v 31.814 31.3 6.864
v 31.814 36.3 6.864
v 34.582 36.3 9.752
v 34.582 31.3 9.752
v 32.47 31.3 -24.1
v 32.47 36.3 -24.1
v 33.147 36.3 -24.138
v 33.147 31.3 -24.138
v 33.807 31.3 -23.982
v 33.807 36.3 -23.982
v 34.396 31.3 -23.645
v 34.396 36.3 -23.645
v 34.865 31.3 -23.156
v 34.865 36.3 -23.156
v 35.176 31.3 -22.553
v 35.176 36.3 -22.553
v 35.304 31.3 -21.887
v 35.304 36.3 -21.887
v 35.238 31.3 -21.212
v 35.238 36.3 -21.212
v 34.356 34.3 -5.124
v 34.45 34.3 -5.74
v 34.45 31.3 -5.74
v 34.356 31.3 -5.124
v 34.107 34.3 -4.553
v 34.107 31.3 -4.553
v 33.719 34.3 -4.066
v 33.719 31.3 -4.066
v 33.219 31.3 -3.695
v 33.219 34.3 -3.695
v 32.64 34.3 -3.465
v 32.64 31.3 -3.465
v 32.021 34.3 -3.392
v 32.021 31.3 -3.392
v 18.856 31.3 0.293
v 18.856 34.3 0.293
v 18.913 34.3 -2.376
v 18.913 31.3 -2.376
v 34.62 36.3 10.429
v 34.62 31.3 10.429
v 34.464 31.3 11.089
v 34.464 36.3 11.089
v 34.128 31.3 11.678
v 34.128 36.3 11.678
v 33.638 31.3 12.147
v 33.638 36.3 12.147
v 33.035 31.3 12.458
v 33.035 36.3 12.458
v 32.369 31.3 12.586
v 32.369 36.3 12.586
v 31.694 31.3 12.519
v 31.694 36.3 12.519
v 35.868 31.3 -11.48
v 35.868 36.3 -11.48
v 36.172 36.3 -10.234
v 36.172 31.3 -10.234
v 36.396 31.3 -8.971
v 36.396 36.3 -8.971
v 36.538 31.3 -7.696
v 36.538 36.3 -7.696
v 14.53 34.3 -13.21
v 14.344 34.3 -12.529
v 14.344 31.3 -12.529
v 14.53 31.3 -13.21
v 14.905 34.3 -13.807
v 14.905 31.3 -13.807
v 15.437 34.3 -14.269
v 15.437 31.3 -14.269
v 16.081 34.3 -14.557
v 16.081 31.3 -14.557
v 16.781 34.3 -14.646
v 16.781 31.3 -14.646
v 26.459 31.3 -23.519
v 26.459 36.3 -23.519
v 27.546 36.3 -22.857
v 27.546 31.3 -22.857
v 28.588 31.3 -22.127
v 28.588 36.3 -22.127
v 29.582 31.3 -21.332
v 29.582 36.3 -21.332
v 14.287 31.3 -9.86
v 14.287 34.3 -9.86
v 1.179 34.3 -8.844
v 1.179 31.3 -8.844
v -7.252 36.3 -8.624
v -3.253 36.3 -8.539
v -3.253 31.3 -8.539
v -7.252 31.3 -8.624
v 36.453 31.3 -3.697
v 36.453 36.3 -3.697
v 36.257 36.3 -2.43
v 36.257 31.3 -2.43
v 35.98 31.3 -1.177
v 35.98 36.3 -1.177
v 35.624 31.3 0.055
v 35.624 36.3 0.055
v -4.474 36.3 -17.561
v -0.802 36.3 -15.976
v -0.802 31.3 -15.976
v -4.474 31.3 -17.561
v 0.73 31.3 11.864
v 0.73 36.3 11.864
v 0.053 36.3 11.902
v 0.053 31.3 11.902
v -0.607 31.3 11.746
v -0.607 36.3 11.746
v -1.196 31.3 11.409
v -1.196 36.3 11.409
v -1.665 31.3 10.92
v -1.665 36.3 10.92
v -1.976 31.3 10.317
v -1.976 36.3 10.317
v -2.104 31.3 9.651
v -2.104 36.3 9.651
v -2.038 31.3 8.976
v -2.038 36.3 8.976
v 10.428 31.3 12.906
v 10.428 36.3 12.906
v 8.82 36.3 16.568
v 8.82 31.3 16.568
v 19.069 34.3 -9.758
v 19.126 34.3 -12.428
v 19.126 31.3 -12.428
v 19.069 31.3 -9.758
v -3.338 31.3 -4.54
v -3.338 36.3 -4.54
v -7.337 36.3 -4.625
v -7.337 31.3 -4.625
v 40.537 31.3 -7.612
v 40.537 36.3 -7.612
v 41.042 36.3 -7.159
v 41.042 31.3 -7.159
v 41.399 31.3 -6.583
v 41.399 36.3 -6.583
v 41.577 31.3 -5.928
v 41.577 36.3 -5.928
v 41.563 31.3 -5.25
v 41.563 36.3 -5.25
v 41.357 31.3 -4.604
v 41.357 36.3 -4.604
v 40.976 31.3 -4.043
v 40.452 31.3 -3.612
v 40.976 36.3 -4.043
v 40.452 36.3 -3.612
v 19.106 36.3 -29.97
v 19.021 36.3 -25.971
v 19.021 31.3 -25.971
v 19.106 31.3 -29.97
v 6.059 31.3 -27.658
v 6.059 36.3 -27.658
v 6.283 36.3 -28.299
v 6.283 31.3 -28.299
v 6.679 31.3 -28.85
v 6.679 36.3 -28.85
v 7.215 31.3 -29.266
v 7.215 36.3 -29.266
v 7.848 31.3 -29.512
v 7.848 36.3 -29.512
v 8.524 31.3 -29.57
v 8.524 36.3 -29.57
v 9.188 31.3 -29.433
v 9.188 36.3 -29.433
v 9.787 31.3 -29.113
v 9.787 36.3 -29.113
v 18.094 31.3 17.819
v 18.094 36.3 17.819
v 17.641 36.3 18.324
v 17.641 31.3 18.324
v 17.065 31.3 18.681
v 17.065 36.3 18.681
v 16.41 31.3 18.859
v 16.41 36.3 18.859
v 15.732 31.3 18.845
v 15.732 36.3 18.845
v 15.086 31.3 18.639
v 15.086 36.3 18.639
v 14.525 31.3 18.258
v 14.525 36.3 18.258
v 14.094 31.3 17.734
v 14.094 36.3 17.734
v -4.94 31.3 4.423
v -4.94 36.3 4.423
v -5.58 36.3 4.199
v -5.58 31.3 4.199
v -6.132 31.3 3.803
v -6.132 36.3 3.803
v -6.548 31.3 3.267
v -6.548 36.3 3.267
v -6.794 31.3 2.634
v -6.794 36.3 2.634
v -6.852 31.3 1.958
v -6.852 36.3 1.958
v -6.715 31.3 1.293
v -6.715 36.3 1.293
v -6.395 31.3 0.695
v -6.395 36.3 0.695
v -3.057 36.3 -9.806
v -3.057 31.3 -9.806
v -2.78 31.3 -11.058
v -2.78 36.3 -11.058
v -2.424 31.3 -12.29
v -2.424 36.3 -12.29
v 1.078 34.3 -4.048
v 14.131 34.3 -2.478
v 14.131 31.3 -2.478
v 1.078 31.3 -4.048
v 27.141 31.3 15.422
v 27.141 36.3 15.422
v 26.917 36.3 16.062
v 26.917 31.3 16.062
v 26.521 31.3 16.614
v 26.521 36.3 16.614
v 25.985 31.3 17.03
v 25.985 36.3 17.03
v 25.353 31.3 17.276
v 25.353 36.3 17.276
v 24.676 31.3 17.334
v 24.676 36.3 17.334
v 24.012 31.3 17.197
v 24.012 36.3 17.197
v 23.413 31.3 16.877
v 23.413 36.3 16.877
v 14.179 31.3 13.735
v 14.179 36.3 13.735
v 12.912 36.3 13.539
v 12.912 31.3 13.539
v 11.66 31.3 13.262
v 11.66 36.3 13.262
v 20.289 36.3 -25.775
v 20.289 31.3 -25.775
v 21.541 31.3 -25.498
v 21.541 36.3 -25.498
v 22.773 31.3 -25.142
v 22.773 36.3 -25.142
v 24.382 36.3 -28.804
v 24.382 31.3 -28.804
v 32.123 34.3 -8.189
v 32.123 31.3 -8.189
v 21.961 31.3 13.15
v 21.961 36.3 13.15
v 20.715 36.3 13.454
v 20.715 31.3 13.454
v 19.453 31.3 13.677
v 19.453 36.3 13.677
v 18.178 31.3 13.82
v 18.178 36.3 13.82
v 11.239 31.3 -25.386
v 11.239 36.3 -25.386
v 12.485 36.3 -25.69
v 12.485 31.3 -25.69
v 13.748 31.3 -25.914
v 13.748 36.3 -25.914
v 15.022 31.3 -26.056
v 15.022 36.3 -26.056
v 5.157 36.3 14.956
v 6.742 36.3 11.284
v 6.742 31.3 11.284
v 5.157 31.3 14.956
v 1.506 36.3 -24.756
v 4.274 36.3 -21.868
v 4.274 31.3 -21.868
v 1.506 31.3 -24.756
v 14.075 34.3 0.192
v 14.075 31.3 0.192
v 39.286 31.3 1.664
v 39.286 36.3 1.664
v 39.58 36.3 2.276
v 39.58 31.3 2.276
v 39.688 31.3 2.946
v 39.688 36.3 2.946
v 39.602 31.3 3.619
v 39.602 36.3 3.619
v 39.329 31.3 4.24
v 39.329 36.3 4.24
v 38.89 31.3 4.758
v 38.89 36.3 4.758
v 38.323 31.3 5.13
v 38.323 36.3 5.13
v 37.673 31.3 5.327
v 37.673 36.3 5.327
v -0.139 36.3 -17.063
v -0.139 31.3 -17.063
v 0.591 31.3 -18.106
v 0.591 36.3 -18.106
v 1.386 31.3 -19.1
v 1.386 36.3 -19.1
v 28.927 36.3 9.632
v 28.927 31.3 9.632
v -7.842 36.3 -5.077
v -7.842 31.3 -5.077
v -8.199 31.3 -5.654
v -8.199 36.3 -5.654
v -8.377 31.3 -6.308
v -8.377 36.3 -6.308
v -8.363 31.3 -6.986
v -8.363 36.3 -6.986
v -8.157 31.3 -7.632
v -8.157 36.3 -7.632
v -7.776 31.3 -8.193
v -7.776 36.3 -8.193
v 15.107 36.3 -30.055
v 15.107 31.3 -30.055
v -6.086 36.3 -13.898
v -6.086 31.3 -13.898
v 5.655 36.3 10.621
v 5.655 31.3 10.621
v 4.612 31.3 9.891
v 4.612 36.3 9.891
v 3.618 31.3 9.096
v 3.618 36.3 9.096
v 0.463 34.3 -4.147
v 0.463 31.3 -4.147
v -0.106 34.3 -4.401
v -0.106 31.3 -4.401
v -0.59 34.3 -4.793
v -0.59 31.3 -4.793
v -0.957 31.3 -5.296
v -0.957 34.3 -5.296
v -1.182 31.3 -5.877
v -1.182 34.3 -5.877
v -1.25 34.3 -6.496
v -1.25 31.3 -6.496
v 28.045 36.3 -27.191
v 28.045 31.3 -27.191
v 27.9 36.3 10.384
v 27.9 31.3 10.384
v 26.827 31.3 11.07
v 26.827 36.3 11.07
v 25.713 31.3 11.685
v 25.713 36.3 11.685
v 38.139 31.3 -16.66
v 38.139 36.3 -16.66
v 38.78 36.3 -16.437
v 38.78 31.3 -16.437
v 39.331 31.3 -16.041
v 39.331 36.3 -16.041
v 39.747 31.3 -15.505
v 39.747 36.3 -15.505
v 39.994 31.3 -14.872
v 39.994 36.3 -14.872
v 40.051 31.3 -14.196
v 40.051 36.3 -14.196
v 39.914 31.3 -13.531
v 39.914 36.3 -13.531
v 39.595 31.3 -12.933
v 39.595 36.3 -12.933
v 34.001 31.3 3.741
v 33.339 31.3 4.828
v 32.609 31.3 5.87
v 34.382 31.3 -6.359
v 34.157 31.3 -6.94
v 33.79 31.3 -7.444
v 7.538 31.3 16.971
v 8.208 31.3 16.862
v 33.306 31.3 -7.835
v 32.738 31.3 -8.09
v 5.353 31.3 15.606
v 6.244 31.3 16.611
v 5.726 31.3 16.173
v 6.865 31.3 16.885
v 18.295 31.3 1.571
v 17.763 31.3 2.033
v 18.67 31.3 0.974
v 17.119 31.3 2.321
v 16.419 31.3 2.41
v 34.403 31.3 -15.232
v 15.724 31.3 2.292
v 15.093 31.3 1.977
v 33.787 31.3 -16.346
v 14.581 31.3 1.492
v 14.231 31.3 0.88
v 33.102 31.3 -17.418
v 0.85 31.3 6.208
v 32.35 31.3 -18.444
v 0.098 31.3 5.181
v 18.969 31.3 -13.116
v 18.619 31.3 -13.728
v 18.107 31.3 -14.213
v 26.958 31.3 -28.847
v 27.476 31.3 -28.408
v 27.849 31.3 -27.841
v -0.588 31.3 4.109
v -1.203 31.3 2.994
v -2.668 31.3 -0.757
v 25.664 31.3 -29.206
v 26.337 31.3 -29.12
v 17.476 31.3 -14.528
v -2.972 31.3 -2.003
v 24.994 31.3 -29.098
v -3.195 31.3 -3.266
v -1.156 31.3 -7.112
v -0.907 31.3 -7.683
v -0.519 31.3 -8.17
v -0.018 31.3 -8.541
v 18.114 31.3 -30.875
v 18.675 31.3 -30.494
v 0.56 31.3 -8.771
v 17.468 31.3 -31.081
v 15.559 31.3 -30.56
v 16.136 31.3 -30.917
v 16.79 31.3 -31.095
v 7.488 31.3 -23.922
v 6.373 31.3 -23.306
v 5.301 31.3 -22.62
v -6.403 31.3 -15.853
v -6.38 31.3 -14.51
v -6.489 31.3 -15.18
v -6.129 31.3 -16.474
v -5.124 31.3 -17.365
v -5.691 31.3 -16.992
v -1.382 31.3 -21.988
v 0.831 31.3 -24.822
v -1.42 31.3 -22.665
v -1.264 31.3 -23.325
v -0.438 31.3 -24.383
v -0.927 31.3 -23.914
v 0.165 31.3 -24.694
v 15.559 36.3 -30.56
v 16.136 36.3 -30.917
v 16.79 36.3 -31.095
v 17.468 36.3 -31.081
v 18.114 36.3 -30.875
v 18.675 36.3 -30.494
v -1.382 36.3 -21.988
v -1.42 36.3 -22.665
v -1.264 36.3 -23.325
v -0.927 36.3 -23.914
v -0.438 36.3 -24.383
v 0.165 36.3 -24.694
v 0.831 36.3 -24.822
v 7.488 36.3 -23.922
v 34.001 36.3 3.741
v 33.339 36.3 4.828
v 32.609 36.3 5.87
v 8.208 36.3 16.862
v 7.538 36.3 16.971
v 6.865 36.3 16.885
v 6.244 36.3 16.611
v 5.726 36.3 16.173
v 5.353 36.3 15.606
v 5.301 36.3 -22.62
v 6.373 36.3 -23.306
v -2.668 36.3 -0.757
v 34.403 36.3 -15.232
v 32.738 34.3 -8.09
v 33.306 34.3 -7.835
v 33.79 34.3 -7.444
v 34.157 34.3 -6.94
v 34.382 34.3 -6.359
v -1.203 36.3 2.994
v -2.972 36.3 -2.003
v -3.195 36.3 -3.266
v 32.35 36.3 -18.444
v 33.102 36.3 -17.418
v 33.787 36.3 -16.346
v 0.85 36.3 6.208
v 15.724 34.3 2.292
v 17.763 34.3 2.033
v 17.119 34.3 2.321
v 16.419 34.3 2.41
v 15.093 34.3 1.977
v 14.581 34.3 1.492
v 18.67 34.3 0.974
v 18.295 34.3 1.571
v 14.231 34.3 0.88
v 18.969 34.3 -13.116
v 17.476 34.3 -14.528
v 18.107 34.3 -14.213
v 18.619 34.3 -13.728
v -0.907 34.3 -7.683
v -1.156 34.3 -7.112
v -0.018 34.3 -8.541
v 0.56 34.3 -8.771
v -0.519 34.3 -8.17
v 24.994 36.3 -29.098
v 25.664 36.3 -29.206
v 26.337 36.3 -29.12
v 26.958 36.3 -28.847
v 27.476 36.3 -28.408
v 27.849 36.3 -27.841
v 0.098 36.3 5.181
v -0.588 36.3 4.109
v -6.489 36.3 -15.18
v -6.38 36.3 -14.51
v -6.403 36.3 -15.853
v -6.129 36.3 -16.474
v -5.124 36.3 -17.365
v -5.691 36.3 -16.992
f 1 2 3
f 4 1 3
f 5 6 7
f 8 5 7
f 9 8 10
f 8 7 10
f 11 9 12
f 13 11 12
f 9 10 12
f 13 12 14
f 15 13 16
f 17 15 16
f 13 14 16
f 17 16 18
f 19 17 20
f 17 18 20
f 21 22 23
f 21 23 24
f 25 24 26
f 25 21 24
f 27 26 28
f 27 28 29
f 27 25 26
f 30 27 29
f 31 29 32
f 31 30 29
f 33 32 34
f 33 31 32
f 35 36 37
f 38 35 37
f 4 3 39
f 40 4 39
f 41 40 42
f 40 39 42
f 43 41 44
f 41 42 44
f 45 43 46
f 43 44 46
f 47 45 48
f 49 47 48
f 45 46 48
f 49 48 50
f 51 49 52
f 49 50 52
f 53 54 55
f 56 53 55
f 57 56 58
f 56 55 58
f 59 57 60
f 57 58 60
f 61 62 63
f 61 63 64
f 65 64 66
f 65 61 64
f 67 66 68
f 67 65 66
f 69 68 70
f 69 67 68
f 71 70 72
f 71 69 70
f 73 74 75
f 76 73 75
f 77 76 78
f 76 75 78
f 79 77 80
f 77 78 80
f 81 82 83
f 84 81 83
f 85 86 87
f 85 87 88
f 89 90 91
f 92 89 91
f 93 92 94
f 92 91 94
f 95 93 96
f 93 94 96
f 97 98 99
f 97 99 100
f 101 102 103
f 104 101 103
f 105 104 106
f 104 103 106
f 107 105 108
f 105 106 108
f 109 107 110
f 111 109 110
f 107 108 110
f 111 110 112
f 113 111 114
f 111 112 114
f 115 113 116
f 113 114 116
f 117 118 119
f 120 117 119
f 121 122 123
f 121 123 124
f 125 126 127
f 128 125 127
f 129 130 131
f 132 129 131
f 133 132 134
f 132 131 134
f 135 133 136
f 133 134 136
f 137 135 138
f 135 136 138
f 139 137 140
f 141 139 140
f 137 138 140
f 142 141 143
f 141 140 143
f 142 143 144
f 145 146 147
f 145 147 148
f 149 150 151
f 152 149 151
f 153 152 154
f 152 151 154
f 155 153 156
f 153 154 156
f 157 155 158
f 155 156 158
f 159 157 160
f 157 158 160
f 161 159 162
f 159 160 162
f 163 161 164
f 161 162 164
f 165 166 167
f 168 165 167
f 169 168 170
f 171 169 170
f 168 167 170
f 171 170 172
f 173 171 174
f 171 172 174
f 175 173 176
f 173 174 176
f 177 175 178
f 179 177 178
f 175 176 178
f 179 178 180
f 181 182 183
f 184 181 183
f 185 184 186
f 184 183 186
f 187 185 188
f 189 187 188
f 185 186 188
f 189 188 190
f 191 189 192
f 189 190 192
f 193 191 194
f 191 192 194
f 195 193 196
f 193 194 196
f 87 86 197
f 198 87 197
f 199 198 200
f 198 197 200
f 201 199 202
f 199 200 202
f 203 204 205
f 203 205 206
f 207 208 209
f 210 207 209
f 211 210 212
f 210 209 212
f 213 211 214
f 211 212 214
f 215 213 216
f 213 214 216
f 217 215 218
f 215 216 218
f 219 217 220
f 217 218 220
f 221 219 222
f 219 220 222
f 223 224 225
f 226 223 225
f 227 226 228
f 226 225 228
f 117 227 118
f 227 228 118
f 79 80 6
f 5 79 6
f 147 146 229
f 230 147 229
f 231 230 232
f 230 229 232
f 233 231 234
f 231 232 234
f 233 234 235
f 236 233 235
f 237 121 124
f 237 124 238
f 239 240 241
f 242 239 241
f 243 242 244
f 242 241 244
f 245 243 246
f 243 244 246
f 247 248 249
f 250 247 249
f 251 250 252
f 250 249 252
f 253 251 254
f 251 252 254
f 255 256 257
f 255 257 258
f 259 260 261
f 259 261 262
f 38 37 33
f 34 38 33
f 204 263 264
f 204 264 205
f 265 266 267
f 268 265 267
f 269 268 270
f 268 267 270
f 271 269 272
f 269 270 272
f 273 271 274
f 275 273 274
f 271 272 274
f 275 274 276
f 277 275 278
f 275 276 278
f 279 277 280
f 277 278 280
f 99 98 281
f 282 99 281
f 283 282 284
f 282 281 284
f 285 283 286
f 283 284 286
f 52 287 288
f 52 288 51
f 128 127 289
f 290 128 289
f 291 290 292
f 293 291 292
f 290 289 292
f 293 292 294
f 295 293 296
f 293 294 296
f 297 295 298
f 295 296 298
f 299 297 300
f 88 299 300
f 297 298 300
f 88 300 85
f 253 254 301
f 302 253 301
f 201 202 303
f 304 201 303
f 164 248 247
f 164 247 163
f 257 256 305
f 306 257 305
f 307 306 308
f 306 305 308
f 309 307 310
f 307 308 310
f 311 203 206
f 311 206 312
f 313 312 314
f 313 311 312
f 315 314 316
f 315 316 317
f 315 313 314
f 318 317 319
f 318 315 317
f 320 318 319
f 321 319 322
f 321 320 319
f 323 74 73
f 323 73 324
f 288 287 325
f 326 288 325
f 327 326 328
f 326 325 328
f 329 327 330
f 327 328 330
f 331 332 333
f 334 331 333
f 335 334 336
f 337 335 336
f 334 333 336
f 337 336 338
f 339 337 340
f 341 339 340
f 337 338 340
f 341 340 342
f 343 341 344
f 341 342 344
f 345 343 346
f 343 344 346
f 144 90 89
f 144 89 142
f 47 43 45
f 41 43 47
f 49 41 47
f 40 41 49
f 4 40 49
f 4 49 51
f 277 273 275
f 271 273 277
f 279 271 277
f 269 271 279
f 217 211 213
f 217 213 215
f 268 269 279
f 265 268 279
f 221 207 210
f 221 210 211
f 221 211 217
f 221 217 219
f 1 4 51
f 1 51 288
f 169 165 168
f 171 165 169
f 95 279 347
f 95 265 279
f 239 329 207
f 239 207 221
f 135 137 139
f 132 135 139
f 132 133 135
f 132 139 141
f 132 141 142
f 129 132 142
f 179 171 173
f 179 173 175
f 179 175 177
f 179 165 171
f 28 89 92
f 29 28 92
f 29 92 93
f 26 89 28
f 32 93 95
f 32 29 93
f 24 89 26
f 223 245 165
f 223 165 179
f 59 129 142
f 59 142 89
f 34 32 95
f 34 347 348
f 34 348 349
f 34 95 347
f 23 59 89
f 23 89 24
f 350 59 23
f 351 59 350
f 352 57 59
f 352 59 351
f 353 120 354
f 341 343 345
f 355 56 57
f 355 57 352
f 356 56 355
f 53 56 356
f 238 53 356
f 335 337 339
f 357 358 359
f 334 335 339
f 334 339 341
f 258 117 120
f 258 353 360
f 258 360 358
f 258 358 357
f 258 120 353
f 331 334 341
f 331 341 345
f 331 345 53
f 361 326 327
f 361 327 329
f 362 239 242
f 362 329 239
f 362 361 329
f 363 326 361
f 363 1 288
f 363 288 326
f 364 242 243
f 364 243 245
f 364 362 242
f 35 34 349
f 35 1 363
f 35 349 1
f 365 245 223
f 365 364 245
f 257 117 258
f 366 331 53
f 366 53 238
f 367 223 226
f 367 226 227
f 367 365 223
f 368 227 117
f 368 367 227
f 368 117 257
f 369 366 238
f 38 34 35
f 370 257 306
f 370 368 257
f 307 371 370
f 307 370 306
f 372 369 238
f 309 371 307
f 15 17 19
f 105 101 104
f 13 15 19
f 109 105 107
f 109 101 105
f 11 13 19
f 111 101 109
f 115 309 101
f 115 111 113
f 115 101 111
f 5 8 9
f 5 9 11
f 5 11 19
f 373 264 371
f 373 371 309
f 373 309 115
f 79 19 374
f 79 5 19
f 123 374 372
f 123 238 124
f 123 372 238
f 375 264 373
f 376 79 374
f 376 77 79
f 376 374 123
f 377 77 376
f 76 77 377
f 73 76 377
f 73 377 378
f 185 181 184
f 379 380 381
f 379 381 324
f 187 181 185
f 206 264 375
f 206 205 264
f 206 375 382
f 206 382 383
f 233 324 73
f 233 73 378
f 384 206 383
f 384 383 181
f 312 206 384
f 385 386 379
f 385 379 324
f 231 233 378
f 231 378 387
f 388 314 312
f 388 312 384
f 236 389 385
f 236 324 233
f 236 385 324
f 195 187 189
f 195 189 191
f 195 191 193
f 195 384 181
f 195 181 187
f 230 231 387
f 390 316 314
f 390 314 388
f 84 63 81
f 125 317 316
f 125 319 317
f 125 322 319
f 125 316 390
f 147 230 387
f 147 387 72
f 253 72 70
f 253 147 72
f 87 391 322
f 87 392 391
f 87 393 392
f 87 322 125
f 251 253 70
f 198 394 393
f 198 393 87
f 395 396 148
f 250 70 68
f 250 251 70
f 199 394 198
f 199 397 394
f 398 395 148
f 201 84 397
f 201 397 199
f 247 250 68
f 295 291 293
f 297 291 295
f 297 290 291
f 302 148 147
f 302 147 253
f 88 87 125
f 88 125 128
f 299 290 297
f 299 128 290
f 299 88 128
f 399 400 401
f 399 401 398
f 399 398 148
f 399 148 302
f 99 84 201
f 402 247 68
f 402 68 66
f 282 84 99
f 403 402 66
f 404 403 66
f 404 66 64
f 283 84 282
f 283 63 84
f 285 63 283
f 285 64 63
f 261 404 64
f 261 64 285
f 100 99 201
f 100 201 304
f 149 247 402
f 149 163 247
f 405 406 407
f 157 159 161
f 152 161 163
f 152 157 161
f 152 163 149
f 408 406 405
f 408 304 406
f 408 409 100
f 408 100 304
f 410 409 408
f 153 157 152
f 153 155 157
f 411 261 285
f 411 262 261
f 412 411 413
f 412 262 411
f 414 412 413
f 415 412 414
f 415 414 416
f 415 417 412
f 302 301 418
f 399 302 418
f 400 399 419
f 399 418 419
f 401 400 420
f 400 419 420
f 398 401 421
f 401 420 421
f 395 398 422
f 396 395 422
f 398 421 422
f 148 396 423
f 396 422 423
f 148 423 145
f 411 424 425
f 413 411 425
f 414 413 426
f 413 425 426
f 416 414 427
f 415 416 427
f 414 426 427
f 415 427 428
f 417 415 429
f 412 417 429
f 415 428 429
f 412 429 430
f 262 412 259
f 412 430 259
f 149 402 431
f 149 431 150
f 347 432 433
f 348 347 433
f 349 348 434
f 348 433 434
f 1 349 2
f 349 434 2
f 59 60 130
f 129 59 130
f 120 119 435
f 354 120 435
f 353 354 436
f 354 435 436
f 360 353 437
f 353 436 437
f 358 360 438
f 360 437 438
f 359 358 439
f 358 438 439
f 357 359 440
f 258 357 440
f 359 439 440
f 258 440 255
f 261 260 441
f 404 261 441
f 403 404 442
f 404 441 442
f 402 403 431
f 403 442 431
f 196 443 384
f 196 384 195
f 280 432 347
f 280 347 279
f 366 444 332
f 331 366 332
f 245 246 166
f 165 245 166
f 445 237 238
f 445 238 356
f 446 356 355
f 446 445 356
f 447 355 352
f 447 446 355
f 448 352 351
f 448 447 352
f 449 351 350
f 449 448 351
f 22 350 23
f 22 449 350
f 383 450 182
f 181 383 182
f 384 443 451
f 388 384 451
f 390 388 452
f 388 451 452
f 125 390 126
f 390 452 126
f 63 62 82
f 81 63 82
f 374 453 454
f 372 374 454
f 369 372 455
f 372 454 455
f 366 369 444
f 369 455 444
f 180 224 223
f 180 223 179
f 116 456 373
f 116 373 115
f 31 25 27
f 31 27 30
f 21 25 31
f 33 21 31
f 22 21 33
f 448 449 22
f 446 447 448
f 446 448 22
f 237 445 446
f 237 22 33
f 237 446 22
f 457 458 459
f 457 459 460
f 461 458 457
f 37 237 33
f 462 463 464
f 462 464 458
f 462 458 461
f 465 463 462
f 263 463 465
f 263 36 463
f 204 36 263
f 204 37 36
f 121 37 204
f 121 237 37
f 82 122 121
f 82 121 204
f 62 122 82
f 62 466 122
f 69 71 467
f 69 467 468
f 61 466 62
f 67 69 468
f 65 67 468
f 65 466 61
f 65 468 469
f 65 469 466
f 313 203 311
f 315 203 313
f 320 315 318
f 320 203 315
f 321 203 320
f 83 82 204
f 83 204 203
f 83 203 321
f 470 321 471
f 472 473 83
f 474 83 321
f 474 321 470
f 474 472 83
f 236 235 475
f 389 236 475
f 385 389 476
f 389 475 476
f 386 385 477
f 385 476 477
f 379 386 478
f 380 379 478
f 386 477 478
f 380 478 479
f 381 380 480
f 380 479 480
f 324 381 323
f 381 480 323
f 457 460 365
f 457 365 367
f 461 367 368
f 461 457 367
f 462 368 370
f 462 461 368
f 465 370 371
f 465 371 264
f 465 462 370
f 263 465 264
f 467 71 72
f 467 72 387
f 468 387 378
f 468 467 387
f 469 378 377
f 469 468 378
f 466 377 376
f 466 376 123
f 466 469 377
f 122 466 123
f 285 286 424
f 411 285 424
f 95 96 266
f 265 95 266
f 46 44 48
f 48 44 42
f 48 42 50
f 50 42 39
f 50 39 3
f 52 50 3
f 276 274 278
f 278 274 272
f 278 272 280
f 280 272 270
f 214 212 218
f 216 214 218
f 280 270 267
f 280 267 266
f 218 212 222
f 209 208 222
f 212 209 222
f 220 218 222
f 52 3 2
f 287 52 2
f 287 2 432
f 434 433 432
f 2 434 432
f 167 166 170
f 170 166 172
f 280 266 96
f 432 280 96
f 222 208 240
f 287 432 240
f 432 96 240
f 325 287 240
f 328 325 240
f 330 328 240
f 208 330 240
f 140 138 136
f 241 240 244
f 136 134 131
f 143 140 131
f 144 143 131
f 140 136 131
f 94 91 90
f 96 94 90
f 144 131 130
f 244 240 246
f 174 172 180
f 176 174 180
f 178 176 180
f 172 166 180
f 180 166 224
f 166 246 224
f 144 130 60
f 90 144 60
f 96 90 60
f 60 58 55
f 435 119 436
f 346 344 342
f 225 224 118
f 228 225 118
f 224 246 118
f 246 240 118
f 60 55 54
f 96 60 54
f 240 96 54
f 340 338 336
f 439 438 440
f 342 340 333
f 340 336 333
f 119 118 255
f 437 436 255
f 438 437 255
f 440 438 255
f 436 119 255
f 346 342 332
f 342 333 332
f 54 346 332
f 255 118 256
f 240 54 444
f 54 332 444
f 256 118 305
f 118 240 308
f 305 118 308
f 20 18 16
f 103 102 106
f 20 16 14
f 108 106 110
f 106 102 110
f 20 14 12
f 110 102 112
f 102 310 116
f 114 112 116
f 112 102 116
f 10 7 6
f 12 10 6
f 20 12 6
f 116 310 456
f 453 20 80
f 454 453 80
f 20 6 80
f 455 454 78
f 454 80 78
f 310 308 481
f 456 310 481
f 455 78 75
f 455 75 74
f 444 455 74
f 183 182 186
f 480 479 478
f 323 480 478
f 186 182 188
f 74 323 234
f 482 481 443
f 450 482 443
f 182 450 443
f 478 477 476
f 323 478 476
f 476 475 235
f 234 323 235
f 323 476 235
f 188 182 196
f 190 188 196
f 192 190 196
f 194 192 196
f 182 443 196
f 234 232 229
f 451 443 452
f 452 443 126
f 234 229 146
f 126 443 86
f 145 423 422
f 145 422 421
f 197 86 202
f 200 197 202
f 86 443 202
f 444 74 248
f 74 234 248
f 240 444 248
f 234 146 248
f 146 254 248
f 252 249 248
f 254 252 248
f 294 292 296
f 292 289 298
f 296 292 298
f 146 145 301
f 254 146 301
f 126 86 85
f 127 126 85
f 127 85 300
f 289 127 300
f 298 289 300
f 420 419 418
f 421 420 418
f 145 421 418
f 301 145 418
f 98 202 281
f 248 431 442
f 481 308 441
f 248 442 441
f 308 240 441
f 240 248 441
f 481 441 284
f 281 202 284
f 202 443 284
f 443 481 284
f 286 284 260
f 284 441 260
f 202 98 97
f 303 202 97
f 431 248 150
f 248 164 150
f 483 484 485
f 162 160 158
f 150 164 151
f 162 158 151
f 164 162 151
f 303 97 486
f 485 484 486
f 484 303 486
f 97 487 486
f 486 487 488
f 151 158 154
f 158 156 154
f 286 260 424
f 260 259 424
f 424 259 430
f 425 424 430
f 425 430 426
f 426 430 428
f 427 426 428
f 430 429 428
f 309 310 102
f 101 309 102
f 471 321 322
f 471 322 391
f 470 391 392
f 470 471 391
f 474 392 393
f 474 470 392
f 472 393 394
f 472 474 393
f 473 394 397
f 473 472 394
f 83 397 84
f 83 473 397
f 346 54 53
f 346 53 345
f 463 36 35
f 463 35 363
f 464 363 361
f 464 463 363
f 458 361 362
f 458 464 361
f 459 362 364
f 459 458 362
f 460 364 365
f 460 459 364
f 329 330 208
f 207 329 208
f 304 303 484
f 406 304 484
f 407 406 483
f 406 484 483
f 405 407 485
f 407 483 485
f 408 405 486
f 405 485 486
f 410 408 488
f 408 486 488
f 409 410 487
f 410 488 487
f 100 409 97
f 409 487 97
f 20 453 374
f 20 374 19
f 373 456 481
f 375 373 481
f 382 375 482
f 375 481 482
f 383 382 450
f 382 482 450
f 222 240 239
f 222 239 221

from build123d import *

# Parameters (mm, degrees)
EXTRUDE001_DEPTH                      = 3
EXTRUDE001_ONTO_SKETCH001_ROLL_ANGLE  = -90
EXTRUDE001_ONTO_SKETCH001_PITCH_ANGLE = -1.786809
EXTRUDE_DEPTH                         = 5
EXTRUDE_ONTO_SKETCH_ROLL_ANGLE        = -90
EXTRUDE_ONTO_SKETCH_PITCH_ANGLE       = -1.786809
CUT_PITCH_ANGLE                       = 3
CUT_PLACEMENT_ANGLE                   = 180


with BuildPart() as servo_horn_gap:
    # Sketch001 as drawn → Extrude001 (new)
    with BuildSketch(Plane.XY):
        with BuildLine():
            Line((-2.39133, 6.362213), (-2.39133, 3.691866))
            Line((-2.39133, 3.691866), (-15.4752, 2.398726))
            ThreePointArc((-15.4752, 2.398726), (-17.158439, 1.689111), (-17.85396, 0))
            ThreePointArc((-17.85396, 0), (-17.158439, -1.689111), (-15.4752, -2.398726))
            Line((-2.39133, -3.691866), (-15.4752, -2.398726))
            Line((-2.39133, -6.362213), (-2.39133, -3.691866))
            ThreePointArc((-2.39133, -6.362213), (-1.613755, -7.907248), (0, -8.529784))
            ThreePointArc((0, -8.529784), (1.613755, -7.907248), (2.39133, -6.362213))
            Line((2.39133, -6.362213), (2.39133, -3.691866))
            Line((2.39133, -3.691866), (15.4752, -2.398726))
            ThreePointArc((15.4752, -2.398726), (17.158439, -1.689111), (17.85396, 0))
            ThreePointArc((17.85396, 0), (17.158439, 1.689111), (15.4752, 2.398726))
            Line((2.39133, 3.691866), (15.4752, 2.398726))
            Line((2.39133, 6.362213), (2.39133, 3.691866))
            ThreePointArc((2.39133, 6.362213), (1.613755, 7.907248), (0, 8.529784))
            ThreePointArc((0, 8.529784), (-1.613755, 7.907248), (-2.39133, 6.362213))
        make_face()
    extrude(amount=EXTRUDE001_DEPTH)


with BuildPart() as servo_horn_gap_1:
    # Extrude001 onto Sketch001 roll: moved
    add(servo_horn_gap.part.rotate(Axis((0, 0, 0), (1, 0, 0)), EXTRUDE001_ONTO_SKETCH001_ROLL_ANGLE))


with BuildPart() as servo_horn_gap_2:
    # Extrude001 onto Sketch001 pitch: moved
    add(servo_horn_gap_1.part.rotate(Axis((0, 0, 0), (0, 1, 0)), EXTRUDE001_ONTO_SKETCH001_PITCH_ANGLE))


with BuildPart() as servo_horn_gap_3:
    # Extrude001 onto Sketch001 placement: moved
    add(servo_horn_gap_2.part.moved(Location((16.5, 34.45, -6.25))))


with BuildPart() as servo_gear_mount:
    # Sketch as drawn → Extrude (new)
    with BuildSketch(Plane.XY):
        with BuildLine():
            ThreePointArc((-5.767545, -19.150337), (-3.901806, -19.615706), (-2, -19.899749))
            Line((-2, -19.899749), (-2, -23.899749))
            ThreePointArc((-2, -23.899749), (0, -25), (2, -23.899749))
            Line((2, -19.899749), (2, -23.899749))
            ThreePointArc((2, -19.899749), (3.901806, -19.615706), (5.767545, -19.150337))
            Line((5.767545, -19.150337), (7.298279, -22.845856))
            ThreePointArc((7.298279, -22.845856), (9.568651, -23.096339), (10.994375, -21.311783))
            Line((9.487389, -17.606518), (10.994375, -21.311783))
            ThreePointArc((9.487389, -17.606518), (11.122885, -16.621715), (12.657034, -15.485461))
            Line((12.657034, -15.485461), (15.485461, -18.313888))
            ThreePointArc((15.485461, -18.313888), (17.67767, -17.67767), (18.313888, -15.485461))
            Line((15.485461, -12.657034), (18.313888, -15.485461))
            ThreePointArc((15.485461, -12.657034), (16.621715, -11.122885), (17.606518, -9.487389))
            Line((17.606518, -9.487389), (21.311783, -10.994375))
            ThreePointArc((21.311783, -10.994375), (23.096339, -9.568651), (22.845856, -7.298279))
            Line((19.150337, -5.767545), (22.845856, -7.298279))
            ThreePointArc((19.150337, -5.767545), (19.615706, -3.901806), (19.899749, -2))
            Line((19.899749, -2), (23.899749, -2))
            ThreePointArc((23.899749, -2), (25, 0), (23.899749, 2))
            Line((19.899749, 2), (23.899749, 2))
            ThreePointArc((19.899749, 2), (19.615706, 3.901806), (19.150337, 5.767545))
            Line((19.150337, 5.767545), (22.845856, 7.298279))
            ThreePointArc((22.845856, 7.298279), (23.096339, 9.568651), (21.311783, 10.994375))
            Line((17.606518, 9.487389), (21.311783, 10.994375))
            ThreePointArc((17.606518, 9.487389), (16.621715, 11.122885), (15.485461, 12.657034))
            Line((15.485461, 12.657034), (18.313888, 15.485461))
            ThreePointArc((18.313888, 15.485461), (17.67767, 17.67767), (15.485461, 18.313888))
            Line((12.657034, 15.485461), (15.485461, 18.313888))
            ThreePointArc((12.657034, 15.485461), (11.122885, 16.621715), (9.487389, 17.606518))
            Line((9.487389, 17.606518), (10.994375, 21.311783))
            ThreePointArc((10.994375, 21.311783), (9.568651, 23.096339), (7.298279, 22.845856))
            Line((5.767545, 19.150337), (7.298279, 22.845856))
            ThreePointArc((5.767545, 19.150337), (3.901806, 19.615706), (2, 19.899749))
            Line((2, 19.899749), (2, 23.899749))
            ThreePointArc((2, 23.899749), (0, 25), (-2, 23.899749))
            Line((-2, 19.899749), (-2, 23.899749))
            ThreePointArc((-2, 19.899749), (-3.90256, 19.615556), (-5.769017, 19.149894))
            Line((-5.769017, 19.149894), (-7.300035, 22.845294))
            ThreePointArc((-7.300035, 22.845294), (-9.570426, 23.095604), (-10.996013, 21.310938))
            Line((-9.488742, 17.605788), (-10.996013, 21.310938))
            ThreePointArc((-9.488742, 17.605788), (-11.123524, 16.621288), (-12.657034, 15.485461))
            Line((-12.657034, 15.485461), (-15.485461, 18.313888))
            ThreePointArc((-15.485461, 18.313888), (-17.67767, 17.67767), (-18.313888, 15.485461))
            Line((-15.485461, 12.657034), (-18.313888, 15.485461))
            ThreePointArc((-15.485461, 12.657034), (-16.621288, 11.123524), (-17.605788, 9.488742))
            Line((-17.605788, 9.488742), (-21.310938, 10.996013))
            ThreePointArc((-21.310938, 10.996013), (-23.095604, 9.570426), (-22.845294, 7.300035))
            Line((-19.149894, 5.769017), (-22.845294, 7.300035))
            ThreePointArc((-19.149894, 5.769017), (-19.615556, 3.90256), (-19.899749, 2))
            Line((-19.899749, 2), (-23.899749, 2))
            ThreePointArc((-23.899749, 2), (-25, 0), (-23.899749, -2))
            Line((-19.899749, -2), (-23.899749, -2))
            ThreePointArc((-19.899749, -2), (-19.615556, -3.90256), (-19.149894, -5.769017))
            Line((-19.149894, -5.769017), (-22.845294, -7.300035))
            ThreePointArc((-22.845294, -7.300035), (-23.095604, -9.570426), (-21.310938, -10.996013))
            Line((-17.605788, -9.488742), (-21.310938, -10.996013))
            ThreePointArc((-17.605788, -9.488742), (-16.621333, -11.123457), (-15.485563, -12.656909))
            Line((-15.485563, -12.656909), (-18.314013, -15.485313))
            ThreePointArc((-18.314013, -15.485313), (-17.677812, -17.677527), (-15.485608, -18.313763))
            Line((-12.657158, -15.485359), (-15.485608, -18.313763))
            ThreePointArc((-12.657158, -15.485359), (-11.122952, -16.621671), (-9.487389, -17.606518))
            Line((-9.487389, -17.606518), (-10.994375, -21.311783))
            ThreePointArc((-10.994375, -21.311783), (-9.568651, -23.096339), (-7.298279, -22.845856))
            Line((-5.767545, -19.150337), (-7.298279, -22.845856))
        make_face()
    extrude(amount=EXTRUDE_DEPTH)


with BuildPart() as servo_gear_mount_1:
    # Extrude onto Sketch roll: moved
    add(servo_gear_mount.part.rotate(Axis((0, 0, 0), (1, 0, 0)), EXTRUDE_ONTO_SKETCH_ROLL_ANGLE))


with BuildPart() as servo_gear_mount_2:
    # Extrude onto Sketch pitch: moved
    add(servo_gear_mount_1.part.rotate(Axis((0, 0, 0), (0, 1, 0)), EXTRUDE_ONTO_SKETCH_PITCH_ANGLE))


with BuildPart() as servo_gear_mount_3:
    # Extrude onto Sketch placement: moved
    add(servo_gear_mount_2.part.moved(Location((16.5, 34.45, -6.25))))


with BuildPart() as servo_gear_mount_4:
    # Extrude placement: moved
    add(servo_gear_mount_3.part.moved(Location((0, -2, 0))))

    # Cut: cut Servo Horn Gap
    add(servo_horn_gap_3.part, mode=Mode.SUBTRACT)


with BuildPart() as servo_gear_mount_5:
    # Cut pitch: moved
    add(servo_gear_mount_4.part.rotate(Axis((0, 0, 0), (0, 1, 0)), CUT_PITCH_ANGLE))


with BuildPart() as servo_gear_mount_6:
    # Cut placement: moved
    add(servo_gear_mount_5.part.moved(Location((32.750343, 68.75, 0.986916))).rotate(Axis((32.750343, 68.75, 0.986916), (0, 0, 1)), CUT_PLACEMENT_ANGLE))


solid = servo_gear_mount_6.part
